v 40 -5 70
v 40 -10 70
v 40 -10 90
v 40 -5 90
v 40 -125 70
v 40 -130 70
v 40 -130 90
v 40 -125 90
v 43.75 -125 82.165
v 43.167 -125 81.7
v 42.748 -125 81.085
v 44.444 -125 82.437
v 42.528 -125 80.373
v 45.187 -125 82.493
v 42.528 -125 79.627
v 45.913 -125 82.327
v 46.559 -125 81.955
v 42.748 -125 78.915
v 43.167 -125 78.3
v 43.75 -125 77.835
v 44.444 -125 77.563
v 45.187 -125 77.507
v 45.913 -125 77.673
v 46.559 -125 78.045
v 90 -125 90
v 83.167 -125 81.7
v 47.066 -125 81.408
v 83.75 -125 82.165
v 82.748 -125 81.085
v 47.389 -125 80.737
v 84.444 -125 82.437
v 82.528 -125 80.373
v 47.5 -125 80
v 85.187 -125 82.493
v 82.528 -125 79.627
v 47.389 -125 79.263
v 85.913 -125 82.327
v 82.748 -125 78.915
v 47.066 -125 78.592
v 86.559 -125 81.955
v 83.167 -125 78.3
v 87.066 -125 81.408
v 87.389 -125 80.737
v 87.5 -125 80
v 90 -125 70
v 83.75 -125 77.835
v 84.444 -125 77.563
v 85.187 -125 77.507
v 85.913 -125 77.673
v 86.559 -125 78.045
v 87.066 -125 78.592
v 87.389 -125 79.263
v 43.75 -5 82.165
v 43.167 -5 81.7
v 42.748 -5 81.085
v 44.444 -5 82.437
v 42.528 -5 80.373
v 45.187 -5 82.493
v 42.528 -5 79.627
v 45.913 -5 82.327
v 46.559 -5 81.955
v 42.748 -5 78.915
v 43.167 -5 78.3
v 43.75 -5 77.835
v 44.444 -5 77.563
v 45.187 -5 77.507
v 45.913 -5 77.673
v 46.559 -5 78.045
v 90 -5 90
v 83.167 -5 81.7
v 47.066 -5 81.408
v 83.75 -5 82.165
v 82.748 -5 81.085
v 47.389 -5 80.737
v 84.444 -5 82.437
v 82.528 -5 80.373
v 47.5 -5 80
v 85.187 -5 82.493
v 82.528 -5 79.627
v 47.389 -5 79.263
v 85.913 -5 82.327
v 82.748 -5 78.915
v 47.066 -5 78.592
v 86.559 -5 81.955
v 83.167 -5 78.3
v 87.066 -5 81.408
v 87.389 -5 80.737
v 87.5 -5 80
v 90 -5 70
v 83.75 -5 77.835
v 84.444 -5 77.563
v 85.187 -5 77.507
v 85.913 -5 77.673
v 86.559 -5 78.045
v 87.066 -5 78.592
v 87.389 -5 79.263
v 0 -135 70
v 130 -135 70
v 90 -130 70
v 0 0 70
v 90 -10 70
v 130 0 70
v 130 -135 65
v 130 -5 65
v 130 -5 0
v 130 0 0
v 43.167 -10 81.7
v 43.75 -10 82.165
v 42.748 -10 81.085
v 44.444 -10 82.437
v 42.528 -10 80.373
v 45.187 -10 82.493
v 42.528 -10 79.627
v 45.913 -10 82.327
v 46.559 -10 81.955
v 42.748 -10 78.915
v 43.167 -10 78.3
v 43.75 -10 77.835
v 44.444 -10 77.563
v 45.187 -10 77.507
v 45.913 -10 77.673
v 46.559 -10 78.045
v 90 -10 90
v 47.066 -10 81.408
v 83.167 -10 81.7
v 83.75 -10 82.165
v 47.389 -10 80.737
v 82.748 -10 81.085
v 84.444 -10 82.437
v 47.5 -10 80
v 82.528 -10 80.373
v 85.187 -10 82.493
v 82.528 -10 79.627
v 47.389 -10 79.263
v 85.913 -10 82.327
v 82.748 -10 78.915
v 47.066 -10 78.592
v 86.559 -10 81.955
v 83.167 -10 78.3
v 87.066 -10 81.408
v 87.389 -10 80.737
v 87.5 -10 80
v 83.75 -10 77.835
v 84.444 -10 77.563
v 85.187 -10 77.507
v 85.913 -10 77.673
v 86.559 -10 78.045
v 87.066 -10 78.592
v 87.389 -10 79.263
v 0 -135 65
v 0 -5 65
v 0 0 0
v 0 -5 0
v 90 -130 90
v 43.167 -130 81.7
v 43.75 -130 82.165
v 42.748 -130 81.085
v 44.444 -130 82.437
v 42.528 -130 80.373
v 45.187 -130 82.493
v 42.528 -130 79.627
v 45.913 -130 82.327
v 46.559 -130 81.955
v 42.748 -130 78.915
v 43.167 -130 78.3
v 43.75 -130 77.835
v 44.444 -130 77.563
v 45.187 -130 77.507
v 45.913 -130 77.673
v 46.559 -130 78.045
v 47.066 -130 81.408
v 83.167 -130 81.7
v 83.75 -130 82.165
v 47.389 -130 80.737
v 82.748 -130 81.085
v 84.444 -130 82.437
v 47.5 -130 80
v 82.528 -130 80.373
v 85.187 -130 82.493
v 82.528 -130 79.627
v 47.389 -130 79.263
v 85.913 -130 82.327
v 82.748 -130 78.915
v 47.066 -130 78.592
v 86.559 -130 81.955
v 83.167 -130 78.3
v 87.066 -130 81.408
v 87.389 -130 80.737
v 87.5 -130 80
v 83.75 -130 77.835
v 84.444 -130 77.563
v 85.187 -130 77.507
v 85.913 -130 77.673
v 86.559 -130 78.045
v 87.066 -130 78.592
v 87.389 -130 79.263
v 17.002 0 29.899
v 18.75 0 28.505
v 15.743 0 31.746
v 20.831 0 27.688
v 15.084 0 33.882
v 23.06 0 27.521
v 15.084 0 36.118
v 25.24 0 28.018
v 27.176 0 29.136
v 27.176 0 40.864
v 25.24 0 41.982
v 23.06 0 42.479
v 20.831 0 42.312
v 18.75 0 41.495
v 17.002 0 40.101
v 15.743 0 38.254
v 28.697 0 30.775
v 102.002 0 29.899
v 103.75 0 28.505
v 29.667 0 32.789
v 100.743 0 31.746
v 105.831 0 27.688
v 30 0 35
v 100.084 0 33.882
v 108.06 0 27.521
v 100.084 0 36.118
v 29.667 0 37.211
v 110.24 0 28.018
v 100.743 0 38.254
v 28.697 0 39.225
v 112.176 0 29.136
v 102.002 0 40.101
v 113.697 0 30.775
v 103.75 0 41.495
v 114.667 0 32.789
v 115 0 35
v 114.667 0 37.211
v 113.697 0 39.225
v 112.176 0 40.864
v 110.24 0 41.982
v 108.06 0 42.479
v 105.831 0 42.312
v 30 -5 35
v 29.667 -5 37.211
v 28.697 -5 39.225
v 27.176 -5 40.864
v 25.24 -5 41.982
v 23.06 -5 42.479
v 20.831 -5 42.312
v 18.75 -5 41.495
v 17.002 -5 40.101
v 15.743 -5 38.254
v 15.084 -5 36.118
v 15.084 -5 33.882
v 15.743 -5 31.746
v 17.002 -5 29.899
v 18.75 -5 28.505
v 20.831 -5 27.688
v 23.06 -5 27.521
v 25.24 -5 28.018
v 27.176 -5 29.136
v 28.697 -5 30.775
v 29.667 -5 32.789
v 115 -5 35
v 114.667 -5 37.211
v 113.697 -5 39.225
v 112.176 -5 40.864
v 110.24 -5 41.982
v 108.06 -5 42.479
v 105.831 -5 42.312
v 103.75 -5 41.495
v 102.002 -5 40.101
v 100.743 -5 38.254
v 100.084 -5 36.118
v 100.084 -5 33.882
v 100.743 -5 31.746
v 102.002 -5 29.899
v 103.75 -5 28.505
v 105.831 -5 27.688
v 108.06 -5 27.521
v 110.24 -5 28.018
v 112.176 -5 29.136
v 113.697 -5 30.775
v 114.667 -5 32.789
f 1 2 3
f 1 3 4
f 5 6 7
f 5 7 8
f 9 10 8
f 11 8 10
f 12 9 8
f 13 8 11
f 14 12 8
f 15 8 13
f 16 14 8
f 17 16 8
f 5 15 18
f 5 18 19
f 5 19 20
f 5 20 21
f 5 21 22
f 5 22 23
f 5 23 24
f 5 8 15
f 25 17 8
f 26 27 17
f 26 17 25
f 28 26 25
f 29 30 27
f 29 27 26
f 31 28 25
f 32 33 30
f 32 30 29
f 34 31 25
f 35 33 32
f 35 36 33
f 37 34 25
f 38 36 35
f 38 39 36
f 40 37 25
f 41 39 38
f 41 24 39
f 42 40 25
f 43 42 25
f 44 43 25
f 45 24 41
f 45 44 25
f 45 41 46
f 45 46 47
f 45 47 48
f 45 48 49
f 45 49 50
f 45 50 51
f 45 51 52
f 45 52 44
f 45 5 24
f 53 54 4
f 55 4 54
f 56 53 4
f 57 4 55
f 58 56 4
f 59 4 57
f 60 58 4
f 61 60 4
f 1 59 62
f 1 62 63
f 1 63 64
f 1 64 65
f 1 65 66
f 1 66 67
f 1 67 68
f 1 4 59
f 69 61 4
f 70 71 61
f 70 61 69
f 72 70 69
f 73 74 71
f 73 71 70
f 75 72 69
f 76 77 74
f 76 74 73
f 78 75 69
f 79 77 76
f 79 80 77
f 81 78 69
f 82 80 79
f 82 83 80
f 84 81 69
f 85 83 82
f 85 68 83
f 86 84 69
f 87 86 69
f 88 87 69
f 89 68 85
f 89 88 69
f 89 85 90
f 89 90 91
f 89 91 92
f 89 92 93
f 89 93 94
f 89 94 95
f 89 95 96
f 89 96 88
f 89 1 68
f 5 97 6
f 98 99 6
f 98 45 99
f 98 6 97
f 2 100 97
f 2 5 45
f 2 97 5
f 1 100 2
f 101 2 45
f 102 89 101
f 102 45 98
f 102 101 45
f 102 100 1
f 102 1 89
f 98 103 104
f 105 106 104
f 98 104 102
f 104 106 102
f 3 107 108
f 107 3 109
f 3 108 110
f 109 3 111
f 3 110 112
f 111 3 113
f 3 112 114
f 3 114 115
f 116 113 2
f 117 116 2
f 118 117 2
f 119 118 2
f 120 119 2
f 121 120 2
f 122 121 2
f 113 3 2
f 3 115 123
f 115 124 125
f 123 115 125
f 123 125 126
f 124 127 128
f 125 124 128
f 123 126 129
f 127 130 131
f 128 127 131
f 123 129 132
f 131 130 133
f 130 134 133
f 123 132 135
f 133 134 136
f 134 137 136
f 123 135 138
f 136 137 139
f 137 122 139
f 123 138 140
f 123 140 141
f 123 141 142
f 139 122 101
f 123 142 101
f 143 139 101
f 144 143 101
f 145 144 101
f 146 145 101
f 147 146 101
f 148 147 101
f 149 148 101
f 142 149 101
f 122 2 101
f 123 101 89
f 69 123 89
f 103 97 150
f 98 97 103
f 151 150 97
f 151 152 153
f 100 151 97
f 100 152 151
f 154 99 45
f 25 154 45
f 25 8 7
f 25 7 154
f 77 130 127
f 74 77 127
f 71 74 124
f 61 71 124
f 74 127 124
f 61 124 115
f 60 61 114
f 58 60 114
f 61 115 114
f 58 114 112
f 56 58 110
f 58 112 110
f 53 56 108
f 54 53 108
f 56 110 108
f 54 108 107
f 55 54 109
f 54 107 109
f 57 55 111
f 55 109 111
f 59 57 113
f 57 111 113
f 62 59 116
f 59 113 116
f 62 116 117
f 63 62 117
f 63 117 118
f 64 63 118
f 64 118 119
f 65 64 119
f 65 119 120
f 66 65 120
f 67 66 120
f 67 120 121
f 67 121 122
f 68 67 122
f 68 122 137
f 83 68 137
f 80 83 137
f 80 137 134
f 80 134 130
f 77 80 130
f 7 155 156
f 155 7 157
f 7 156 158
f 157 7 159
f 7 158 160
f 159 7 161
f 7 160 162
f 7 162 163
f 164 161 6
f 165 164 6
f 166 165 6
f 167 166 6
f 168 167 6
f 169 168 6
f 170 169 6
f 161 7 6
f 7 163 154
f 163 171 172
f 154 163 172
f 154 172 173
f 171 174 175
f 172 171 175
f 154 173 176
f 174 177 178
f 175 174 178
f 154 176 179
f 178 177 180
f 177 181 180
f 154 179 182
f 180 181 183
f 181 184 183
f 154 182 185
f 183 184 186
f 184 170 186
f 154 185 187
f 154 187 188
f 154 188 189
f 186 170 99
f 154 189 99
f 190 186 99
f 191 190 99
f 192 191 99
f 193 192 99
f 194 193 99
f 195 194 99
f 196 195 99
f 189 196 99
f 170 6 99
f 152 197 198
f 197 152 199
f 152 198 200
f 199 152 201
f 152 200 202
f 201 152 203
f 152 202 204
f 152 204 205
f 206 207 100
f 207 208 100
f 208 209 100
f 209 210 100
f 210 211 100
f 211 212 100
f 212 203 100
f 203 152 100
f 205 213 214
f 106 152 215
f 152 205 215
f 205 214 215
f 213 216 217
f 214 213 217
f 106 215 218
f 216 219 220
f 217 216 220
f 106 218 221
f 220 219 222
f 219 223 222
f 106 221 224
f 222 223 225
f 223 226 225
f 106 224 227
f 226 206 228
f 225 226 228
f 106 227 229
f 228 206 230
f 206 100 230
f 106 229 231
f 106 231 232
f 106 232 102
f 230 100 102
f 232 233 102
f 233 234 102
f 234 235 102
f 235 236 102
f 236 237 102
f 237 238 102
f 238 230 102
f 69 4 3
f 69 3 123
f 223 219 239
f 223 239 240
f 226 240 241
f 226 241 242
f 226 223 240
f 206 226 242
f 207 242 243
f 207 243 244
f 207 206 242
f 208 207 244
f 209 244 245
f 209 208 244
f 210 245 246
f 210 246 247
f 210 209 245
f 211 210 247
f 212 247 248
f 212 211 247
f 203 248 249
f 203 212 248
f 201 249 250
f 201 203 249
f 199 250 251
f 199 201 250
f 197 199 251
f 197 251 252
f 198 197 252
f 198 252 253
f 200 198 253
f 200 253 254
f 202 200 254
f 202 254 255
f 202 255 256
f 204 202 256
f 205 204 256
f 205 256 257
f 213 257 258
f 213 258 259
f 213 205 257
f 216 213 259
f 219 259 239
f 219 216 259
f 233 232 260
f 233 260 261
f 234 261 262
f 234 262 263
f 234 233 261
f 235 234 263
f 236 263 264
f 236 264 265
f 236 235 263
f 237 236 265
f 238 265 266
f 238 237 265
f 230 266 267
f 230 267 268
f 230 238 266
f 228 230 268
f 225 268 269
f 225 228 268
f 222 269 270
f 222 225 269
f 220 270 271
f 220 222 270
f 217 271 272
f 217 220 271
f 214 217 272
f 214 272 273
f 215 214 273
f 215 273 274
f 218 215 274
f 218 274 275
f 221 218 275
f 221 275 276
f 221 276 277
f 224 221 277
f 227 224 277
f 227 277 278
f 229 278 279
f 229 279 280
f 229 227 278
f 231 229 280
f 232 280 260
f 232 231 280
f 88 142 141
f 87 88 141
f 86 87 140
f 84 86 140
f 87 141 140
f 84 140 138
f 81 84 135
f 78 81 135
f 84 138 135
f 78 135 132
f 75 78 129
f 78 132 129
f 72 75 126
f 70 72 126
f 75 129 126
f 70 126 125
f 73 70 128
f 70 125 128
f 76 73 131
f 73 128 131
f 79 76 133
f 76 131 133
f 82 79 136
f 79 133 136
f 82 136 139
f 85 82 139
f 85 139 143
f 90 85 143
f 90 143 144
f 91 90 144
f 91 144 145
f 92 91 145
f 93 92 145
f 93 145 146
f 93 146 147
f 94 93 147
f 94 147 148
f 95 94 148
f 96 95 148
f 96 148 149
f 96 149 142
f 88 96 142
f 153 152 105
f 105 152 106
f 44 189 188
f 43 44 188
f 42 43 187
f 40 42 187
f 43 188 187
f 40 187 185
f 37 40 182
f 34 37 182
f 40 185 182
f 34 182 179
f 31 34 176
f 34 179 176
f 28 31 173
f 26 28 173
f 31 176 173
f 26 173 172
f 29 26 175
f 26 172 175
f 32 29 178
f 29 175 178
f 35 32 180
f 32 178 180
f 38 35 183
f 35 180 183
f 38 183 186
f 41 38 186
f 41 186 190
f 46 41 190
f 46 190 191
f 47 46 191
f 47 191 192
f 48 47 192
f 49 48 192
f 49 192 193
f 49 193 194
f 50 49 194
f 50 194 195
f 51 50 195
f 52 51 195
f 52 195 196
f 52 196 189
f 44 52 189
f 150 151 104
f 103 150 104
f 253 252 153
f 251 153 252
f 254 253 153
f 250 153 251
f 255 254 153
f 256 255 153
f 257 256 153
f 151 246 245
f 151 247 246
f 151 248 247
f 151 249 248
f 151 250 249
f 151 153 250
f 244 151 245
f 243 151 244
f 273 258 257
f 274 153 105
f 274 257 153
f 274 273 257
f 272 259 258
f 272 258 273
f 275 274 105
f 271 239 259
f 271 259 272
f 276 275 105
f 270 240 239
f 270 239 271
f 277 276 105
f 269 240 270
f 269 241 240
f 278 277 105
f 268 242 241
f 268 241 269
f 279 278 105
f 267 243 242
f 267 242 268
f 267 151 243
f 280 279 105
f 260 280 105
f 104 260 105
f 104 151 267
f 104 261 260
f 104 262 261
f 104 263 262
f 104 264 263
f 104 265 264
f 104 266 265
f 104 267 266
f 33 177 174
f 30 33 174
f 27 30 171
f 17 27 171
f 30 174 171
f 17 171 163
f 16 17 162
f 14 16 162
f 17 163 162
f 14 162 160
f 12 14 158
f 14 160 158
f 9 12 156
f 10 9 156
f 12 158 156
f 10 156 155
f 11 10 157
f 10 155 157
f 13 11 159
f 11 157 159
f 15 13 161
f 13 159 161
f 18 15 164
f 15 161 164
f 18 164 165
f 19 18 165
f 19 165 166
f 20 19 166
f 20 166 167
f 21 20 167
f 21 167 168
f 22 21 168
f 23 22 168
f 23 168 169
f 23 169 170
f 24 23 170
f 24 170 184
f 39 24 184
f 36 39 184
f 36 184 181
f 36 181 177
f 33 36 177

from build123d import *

# Parameters (mm, degrees)
F0_W     = 130
F0_H     = 70
F0_R     = 7.5
F1_DEPTH = 5
F2_W     = 130
F2_H     = 5
F3_DEPTH = 130
F4_W     = 50
F4_H     = 5
F5_DEPTH = 20
F6_R     = 2.5
F7_DEPTH = 130.001


with BuildPart() as f1:
    # F0 (on Front) → F1 (new body)
    with BuildSketch(Plane.XZ):
        with Locations((65, 35)):
            Rectangle(F0_W, F0_H)
        with Locations((22.5, 35)):
            Circle(F0_R, mode=Mode.SUBTRACT)
        with Locations((107.5, 35)):
            Circle(F0_R, mode=Mode.SUBTRACT)
    extrude(amount=F1_DEPTH)

    # F2 (on face) → F3 (join)
    with BuildSketch(Plane.XZ.offset(5)):
        with Locations((65, 67.5)):
            Rectangle(F2_W, F2_H)
    extrude(amount=F3_DEPTH)

    # F4 (on face) → F5 (join)
    with BuildSketch(Plane.XY.offset(70)):
        with Locations((65, -127.5)):
            Rectangle(F4_W, F4_H)
        with Locations((65, -7.5)):
            Rectangle(F4_W, F4_H)
    extrude(amount=F5_DEPTH)

    # F6 (on face) → F7 (cut, through all)
    with BuildSketch(Plane.XZ.offset(130)):
        with Locations((45, 80)):
            Circle(F6_R)
        with Locations((85, 80)):
            Circle(F6_R)
    extrude(amount=-F7_DEPTH, mode=Mode.SUBTRACT)


solid = f1.part
